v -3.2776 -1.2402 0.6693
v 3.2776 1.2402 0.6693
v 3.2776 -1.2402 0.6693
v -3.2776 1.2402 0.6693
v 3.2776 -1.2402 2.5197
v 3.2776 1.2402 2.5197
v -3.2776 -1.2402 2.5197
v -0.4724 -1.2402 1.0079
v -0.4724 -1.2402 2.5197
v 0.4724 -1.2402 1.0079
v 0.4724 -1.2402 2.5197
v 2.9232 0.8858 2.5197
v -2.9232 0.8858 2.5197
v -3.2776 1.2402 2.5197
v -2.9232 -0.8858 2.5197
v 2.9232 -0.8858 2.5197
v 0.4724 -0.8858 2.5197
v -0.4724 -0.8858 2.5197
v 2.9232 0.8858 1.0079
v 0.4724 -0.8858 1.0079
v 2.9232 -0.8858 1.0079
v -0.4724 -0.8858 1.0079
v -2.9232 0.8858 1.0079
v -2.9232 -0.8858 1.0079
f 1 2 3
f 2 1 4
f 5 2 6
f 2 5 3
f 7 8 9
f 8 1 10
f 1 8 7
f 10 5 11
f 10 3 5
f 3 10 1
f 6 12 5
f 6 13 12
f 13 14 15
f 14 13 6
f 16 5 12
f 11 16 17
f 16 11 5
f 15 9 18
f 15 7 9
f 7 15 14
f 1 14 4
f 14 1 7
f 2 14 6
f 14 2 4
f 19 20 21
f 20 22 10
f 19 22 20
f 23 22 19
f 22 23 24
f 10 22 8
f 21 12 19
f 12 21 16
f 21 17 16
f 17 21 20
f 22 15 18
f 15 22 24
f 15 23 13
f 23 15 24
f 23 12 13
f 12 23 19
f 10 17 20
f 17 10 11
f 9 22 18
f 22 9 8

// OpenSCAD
//  OpenSCAD model for adding shrouds to pin headers
//  5/30/14 By F. Huettig, Adapteva, Inc.
//  Free for any use, no warrantees.

/*  2mm 2x15
width = 32.65;  // mm
depth = 6.3;
cutout_wid = 2.4;
cutout_depth = 4.7-0.86;
i_wid = 30.85;  // width/depth of 'digout'
i_depth = 4.5;
height = 4.7;
innerheight = 0.86;  // Not sure about this one
altitude = 1.7;
*/

// 2mm 2x7
width = 16.65;  // mm
depth = 6.3;
cutout_wid = 2.4;
cutout_depth = 4.7-0.86;
i_wid = 14.85;  // width/depth of 'digout'
i_depth = 4.5;
height = 4.7;
innerheight = 0.86;  // Not sure about this one
altitude = 1.7;


// derived
xctr = width/2;
yctr = depth/2;
i_left = xctr - (i_wid/2);
i_bot  = yctr - (i_depth/2);
c_left = xctr - (cutout_wid/2);
c_bot  = height - cutout_depth;

// virtecies of poly's
outer = [
[0, depth],
[width, depth],
[width, 0],
[0, 0]
];

inner = [
[i_left, i_bot],
[i_left, depth-i_bot],
[width-i_left, depth-i_bot],
[width-i_left, i_bot]
];

cutout = [
[c_left, yctr-depth],
[c_left, yctr],
[c_left+cutout_wid, yctr],
[c_left+cutout_wid, yctr-depth]
];

scale(10 / 25.4)  // Wings3D will assume units of 1/10" (??)
	translate([-xctr, -yctr, altitude]) {
		difference() {
			linear_extrude(height, false)
				polygon(outer);

			translate([0, 0, innerheight])
				linear_extrude(height, false)  // intentionally higher than needed?
					polygon(inner);

			translate([0, 0, c_bot])
				linear_extrude(height, false)
					polygon(cutout);
		}
	}
